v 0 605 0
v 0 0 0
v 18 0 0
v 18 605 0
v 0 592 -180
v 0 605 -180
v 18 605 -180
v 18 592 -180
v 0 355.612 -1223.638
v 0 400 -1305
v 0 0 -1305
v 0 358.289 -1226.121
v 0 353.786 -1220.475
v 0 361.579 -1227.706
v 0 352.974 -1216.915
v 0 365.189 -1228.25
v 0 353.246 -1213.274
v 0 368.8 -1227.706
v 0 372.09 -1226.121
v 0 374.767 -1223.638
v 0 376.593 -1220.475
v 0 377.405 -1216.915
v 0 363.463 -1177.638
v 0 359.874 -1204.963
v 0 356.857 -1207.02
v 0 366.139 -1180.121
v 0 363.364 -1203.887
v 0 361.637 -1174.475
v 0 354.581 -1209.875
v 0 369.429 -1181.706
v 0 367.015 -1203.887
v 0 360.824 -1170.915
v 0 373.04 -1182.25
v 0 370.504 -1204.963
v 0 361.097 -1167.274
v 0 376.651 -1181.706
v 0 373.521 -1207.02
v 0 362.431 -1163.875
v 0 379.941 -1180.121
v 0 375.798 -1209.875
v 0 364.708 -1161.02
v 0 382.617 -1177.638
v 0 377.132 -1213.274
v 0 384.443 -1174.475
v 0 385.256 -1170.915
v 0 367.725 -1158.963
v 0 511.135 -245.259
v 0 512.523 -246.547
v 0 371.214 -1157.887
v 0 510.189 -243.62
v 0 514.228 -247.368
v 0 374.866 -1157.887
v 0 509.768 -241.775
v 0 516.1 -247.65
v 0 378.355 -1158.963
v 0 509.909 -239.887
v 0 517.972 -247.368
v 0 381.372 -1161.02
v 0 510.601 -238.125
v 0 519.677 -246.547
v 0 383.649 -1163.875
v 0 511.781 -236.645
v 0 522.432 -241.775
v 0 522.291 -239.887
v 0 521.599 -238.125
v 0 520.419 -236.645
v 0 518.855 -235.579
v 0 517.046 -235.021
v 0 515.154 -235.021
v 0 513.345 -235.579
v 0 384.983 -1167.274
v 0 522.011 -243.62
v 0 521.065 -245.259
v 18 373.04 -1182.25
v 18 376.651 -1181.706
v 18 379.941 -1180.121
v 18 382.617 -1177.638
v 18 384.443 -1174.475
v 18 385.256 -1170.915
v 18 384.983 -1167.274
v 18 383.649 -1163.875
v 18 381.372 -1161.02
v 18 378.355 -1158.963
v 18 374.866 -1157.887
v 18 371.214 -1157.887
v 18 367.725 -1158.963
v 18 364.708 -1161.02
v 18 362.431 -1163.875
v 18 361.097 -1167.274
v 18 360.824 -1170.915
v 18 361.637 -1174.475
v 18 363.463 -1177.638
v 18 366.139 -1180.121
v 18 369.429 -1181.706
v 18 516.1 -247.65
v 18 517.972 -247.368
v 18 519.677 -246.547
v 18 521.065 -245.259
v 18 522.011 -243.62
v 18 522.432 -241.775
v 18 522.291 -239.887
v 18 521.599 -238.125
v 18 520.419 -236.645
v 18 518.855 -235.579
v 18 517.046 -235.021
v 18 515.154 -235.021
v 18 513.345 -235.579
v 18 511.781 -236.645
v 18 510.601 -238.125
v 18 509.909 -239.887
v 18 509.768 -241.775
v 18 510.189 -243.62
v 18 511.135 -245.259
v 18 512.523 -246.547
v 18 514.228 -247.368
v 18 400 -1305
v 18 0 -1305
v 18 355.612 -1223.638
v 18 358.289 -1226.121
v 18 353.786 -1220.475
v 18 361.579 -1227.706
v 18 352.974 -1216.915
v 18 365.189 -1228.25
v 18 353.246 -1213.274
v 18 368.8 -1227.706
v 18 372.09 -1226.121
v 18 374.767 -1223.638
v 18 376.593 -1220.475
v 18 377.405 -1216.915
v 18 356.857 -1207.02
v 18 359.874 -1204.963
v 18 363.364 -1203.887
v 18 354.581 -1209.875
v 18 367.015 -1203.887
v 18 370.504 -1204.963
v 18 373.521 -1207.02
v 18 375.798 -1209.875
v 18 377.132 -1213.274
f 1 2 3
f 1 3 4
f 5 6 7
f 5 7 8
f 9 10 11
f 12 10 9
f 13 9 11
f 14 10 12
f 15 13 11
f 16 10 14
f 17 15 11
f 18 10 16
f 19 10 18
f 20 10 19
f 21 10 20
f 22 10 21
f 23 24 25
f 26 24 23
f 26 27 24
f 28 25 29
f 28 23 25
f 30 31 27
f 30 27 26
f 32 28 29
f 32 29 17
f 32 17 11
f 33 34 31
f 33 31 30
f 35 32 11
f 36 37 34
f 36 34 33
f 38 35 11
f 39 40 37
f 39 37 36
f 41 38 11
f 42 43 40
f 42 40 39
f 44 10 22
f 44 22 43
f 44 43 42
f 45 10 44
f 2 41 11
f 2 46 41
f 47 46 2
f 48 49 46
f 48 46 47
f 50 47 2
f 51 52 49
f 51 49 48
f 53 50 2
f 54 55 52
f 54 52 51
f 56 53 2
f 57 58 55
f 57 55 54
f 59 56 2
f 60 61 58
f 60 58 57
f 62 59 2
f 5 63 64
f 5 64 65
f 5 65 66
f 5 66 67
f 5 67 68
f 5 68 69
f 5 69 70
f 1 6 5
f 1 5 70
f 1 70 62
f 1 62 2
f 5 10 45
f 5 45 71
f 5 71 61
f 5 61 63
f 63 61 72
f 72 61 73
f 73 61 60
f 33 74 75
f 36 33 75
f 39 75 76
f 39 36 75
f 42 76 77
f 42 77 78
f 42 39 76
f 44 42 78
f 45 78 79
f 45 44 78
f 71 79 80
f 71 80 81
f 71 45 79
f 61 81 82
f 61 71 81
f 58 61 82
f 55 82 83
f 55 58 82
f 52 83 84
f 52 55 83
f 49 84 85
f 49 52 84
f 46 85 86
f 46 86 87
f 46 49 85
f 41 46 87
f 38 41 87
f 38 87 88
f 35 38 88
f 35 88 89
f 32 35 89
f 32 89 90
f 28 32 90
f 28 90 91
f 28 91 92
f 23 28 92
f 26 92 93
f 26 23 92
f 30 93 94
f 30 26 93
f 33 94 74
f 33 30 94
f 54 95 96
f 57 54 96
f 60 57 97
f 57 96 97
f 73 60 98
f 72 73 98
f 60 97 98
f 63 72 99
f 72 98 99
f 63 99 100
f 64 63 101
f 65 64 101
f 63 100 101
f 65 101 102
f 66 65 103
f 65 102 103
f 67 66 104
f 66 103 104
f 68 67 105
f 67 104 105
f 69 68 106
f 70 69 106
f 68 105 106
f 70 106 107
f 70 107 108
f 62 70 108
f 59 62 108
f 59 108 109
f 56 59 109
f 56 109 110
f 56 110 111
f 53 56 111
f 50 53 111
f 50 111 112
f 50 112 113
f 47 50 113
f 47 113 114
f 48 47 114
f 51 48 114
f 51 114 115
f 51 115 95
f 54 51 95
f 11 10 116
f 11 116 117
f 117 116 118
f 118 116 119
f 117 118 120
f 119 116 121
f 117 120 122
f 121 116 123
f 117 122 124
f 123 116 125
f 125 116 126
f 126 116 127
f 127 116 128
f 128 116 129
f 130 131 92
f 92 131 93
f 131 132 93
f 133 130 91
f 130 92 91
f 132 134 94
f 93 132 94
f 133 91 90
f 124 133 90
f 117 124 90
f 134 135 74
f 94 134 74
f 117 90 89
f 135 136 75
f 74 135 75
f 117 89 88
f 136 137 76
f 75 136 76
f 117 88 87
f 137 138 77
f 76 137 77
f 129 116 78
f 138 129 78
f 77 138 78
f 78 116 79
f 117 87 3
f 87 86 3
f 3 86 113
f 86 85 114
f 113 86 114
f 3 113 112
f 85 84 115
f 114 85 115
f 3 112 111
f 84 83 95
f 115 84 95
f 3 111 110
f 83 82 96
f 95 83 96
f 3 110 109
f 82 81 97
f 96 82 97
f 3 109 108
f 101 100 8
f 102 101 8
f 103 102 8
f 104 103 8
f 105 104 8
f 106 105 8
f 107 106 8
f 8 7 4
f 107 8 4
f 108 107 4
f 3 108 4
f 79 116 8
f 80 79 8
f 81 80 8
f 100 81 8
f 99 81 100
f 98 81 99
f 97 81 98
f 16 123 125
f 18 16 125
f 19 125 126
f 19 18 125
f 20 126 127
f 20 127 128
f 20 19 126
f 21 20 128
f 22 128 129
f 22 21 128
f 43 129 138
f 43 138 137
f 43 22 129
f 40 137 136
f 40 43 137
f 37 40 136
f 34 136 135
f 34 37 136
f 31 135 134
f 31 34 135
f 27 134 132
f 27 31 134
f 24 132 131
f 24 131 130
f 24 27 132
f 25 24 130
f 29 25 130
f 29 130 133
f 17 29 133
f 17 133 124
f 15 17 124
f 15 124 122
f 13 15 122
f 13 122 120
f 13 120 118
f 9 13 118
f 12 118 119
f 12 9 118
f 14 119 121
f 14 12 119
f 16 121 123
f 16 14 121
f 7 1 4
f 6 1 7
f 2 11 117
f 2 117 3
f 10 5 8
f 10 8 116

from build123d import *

# Parameters (mm, degrees)
SKETCH1_R           = 12.25
BOSS_EXTRUDE1_DEPTH = 18
SKETCH2_R           = 6.35
CUT_EXTRUDE1_DEPTH  = 40


with BuildPart() as part:
    # Sketch1 → Boss-Extrude1 (new body)
    with BuildSketch(Plane(origin=(0, 0, 0), x_dir=(0, 0, -1), z_dir=(1, 0, 0))):
        Polygon((0, 0), (0, 605), (180, 605), (180, 592), (1305, 400), (1305, 0), align=None)
        with Locations((1216, 365.189333333)):
            Circle(SKETCH1_R, mode=Mode.SUBTRACT)
        with Locations((1170, 373.04)):
            Circle(SKETCH1_R, mode=Mode.SUBTRACT)
    extrude(amount=BOSS_EXTRUDE1_DEPTH)

    # Sketch2 → Cut-Extrude1 (cut)
    with BuildSketch(Plane(origin=(18, 0, 0), x_dir=(0, 0, -1), z_dir=(1, 0, 0))):
        with Locations((241.3, 516.1)):
            Circle(SKETCH2_R)
    extrude(amount=-CUT_EXTRUDE1_DEPTH, mode=Mode.SUBTRACT)


solid = part.part
